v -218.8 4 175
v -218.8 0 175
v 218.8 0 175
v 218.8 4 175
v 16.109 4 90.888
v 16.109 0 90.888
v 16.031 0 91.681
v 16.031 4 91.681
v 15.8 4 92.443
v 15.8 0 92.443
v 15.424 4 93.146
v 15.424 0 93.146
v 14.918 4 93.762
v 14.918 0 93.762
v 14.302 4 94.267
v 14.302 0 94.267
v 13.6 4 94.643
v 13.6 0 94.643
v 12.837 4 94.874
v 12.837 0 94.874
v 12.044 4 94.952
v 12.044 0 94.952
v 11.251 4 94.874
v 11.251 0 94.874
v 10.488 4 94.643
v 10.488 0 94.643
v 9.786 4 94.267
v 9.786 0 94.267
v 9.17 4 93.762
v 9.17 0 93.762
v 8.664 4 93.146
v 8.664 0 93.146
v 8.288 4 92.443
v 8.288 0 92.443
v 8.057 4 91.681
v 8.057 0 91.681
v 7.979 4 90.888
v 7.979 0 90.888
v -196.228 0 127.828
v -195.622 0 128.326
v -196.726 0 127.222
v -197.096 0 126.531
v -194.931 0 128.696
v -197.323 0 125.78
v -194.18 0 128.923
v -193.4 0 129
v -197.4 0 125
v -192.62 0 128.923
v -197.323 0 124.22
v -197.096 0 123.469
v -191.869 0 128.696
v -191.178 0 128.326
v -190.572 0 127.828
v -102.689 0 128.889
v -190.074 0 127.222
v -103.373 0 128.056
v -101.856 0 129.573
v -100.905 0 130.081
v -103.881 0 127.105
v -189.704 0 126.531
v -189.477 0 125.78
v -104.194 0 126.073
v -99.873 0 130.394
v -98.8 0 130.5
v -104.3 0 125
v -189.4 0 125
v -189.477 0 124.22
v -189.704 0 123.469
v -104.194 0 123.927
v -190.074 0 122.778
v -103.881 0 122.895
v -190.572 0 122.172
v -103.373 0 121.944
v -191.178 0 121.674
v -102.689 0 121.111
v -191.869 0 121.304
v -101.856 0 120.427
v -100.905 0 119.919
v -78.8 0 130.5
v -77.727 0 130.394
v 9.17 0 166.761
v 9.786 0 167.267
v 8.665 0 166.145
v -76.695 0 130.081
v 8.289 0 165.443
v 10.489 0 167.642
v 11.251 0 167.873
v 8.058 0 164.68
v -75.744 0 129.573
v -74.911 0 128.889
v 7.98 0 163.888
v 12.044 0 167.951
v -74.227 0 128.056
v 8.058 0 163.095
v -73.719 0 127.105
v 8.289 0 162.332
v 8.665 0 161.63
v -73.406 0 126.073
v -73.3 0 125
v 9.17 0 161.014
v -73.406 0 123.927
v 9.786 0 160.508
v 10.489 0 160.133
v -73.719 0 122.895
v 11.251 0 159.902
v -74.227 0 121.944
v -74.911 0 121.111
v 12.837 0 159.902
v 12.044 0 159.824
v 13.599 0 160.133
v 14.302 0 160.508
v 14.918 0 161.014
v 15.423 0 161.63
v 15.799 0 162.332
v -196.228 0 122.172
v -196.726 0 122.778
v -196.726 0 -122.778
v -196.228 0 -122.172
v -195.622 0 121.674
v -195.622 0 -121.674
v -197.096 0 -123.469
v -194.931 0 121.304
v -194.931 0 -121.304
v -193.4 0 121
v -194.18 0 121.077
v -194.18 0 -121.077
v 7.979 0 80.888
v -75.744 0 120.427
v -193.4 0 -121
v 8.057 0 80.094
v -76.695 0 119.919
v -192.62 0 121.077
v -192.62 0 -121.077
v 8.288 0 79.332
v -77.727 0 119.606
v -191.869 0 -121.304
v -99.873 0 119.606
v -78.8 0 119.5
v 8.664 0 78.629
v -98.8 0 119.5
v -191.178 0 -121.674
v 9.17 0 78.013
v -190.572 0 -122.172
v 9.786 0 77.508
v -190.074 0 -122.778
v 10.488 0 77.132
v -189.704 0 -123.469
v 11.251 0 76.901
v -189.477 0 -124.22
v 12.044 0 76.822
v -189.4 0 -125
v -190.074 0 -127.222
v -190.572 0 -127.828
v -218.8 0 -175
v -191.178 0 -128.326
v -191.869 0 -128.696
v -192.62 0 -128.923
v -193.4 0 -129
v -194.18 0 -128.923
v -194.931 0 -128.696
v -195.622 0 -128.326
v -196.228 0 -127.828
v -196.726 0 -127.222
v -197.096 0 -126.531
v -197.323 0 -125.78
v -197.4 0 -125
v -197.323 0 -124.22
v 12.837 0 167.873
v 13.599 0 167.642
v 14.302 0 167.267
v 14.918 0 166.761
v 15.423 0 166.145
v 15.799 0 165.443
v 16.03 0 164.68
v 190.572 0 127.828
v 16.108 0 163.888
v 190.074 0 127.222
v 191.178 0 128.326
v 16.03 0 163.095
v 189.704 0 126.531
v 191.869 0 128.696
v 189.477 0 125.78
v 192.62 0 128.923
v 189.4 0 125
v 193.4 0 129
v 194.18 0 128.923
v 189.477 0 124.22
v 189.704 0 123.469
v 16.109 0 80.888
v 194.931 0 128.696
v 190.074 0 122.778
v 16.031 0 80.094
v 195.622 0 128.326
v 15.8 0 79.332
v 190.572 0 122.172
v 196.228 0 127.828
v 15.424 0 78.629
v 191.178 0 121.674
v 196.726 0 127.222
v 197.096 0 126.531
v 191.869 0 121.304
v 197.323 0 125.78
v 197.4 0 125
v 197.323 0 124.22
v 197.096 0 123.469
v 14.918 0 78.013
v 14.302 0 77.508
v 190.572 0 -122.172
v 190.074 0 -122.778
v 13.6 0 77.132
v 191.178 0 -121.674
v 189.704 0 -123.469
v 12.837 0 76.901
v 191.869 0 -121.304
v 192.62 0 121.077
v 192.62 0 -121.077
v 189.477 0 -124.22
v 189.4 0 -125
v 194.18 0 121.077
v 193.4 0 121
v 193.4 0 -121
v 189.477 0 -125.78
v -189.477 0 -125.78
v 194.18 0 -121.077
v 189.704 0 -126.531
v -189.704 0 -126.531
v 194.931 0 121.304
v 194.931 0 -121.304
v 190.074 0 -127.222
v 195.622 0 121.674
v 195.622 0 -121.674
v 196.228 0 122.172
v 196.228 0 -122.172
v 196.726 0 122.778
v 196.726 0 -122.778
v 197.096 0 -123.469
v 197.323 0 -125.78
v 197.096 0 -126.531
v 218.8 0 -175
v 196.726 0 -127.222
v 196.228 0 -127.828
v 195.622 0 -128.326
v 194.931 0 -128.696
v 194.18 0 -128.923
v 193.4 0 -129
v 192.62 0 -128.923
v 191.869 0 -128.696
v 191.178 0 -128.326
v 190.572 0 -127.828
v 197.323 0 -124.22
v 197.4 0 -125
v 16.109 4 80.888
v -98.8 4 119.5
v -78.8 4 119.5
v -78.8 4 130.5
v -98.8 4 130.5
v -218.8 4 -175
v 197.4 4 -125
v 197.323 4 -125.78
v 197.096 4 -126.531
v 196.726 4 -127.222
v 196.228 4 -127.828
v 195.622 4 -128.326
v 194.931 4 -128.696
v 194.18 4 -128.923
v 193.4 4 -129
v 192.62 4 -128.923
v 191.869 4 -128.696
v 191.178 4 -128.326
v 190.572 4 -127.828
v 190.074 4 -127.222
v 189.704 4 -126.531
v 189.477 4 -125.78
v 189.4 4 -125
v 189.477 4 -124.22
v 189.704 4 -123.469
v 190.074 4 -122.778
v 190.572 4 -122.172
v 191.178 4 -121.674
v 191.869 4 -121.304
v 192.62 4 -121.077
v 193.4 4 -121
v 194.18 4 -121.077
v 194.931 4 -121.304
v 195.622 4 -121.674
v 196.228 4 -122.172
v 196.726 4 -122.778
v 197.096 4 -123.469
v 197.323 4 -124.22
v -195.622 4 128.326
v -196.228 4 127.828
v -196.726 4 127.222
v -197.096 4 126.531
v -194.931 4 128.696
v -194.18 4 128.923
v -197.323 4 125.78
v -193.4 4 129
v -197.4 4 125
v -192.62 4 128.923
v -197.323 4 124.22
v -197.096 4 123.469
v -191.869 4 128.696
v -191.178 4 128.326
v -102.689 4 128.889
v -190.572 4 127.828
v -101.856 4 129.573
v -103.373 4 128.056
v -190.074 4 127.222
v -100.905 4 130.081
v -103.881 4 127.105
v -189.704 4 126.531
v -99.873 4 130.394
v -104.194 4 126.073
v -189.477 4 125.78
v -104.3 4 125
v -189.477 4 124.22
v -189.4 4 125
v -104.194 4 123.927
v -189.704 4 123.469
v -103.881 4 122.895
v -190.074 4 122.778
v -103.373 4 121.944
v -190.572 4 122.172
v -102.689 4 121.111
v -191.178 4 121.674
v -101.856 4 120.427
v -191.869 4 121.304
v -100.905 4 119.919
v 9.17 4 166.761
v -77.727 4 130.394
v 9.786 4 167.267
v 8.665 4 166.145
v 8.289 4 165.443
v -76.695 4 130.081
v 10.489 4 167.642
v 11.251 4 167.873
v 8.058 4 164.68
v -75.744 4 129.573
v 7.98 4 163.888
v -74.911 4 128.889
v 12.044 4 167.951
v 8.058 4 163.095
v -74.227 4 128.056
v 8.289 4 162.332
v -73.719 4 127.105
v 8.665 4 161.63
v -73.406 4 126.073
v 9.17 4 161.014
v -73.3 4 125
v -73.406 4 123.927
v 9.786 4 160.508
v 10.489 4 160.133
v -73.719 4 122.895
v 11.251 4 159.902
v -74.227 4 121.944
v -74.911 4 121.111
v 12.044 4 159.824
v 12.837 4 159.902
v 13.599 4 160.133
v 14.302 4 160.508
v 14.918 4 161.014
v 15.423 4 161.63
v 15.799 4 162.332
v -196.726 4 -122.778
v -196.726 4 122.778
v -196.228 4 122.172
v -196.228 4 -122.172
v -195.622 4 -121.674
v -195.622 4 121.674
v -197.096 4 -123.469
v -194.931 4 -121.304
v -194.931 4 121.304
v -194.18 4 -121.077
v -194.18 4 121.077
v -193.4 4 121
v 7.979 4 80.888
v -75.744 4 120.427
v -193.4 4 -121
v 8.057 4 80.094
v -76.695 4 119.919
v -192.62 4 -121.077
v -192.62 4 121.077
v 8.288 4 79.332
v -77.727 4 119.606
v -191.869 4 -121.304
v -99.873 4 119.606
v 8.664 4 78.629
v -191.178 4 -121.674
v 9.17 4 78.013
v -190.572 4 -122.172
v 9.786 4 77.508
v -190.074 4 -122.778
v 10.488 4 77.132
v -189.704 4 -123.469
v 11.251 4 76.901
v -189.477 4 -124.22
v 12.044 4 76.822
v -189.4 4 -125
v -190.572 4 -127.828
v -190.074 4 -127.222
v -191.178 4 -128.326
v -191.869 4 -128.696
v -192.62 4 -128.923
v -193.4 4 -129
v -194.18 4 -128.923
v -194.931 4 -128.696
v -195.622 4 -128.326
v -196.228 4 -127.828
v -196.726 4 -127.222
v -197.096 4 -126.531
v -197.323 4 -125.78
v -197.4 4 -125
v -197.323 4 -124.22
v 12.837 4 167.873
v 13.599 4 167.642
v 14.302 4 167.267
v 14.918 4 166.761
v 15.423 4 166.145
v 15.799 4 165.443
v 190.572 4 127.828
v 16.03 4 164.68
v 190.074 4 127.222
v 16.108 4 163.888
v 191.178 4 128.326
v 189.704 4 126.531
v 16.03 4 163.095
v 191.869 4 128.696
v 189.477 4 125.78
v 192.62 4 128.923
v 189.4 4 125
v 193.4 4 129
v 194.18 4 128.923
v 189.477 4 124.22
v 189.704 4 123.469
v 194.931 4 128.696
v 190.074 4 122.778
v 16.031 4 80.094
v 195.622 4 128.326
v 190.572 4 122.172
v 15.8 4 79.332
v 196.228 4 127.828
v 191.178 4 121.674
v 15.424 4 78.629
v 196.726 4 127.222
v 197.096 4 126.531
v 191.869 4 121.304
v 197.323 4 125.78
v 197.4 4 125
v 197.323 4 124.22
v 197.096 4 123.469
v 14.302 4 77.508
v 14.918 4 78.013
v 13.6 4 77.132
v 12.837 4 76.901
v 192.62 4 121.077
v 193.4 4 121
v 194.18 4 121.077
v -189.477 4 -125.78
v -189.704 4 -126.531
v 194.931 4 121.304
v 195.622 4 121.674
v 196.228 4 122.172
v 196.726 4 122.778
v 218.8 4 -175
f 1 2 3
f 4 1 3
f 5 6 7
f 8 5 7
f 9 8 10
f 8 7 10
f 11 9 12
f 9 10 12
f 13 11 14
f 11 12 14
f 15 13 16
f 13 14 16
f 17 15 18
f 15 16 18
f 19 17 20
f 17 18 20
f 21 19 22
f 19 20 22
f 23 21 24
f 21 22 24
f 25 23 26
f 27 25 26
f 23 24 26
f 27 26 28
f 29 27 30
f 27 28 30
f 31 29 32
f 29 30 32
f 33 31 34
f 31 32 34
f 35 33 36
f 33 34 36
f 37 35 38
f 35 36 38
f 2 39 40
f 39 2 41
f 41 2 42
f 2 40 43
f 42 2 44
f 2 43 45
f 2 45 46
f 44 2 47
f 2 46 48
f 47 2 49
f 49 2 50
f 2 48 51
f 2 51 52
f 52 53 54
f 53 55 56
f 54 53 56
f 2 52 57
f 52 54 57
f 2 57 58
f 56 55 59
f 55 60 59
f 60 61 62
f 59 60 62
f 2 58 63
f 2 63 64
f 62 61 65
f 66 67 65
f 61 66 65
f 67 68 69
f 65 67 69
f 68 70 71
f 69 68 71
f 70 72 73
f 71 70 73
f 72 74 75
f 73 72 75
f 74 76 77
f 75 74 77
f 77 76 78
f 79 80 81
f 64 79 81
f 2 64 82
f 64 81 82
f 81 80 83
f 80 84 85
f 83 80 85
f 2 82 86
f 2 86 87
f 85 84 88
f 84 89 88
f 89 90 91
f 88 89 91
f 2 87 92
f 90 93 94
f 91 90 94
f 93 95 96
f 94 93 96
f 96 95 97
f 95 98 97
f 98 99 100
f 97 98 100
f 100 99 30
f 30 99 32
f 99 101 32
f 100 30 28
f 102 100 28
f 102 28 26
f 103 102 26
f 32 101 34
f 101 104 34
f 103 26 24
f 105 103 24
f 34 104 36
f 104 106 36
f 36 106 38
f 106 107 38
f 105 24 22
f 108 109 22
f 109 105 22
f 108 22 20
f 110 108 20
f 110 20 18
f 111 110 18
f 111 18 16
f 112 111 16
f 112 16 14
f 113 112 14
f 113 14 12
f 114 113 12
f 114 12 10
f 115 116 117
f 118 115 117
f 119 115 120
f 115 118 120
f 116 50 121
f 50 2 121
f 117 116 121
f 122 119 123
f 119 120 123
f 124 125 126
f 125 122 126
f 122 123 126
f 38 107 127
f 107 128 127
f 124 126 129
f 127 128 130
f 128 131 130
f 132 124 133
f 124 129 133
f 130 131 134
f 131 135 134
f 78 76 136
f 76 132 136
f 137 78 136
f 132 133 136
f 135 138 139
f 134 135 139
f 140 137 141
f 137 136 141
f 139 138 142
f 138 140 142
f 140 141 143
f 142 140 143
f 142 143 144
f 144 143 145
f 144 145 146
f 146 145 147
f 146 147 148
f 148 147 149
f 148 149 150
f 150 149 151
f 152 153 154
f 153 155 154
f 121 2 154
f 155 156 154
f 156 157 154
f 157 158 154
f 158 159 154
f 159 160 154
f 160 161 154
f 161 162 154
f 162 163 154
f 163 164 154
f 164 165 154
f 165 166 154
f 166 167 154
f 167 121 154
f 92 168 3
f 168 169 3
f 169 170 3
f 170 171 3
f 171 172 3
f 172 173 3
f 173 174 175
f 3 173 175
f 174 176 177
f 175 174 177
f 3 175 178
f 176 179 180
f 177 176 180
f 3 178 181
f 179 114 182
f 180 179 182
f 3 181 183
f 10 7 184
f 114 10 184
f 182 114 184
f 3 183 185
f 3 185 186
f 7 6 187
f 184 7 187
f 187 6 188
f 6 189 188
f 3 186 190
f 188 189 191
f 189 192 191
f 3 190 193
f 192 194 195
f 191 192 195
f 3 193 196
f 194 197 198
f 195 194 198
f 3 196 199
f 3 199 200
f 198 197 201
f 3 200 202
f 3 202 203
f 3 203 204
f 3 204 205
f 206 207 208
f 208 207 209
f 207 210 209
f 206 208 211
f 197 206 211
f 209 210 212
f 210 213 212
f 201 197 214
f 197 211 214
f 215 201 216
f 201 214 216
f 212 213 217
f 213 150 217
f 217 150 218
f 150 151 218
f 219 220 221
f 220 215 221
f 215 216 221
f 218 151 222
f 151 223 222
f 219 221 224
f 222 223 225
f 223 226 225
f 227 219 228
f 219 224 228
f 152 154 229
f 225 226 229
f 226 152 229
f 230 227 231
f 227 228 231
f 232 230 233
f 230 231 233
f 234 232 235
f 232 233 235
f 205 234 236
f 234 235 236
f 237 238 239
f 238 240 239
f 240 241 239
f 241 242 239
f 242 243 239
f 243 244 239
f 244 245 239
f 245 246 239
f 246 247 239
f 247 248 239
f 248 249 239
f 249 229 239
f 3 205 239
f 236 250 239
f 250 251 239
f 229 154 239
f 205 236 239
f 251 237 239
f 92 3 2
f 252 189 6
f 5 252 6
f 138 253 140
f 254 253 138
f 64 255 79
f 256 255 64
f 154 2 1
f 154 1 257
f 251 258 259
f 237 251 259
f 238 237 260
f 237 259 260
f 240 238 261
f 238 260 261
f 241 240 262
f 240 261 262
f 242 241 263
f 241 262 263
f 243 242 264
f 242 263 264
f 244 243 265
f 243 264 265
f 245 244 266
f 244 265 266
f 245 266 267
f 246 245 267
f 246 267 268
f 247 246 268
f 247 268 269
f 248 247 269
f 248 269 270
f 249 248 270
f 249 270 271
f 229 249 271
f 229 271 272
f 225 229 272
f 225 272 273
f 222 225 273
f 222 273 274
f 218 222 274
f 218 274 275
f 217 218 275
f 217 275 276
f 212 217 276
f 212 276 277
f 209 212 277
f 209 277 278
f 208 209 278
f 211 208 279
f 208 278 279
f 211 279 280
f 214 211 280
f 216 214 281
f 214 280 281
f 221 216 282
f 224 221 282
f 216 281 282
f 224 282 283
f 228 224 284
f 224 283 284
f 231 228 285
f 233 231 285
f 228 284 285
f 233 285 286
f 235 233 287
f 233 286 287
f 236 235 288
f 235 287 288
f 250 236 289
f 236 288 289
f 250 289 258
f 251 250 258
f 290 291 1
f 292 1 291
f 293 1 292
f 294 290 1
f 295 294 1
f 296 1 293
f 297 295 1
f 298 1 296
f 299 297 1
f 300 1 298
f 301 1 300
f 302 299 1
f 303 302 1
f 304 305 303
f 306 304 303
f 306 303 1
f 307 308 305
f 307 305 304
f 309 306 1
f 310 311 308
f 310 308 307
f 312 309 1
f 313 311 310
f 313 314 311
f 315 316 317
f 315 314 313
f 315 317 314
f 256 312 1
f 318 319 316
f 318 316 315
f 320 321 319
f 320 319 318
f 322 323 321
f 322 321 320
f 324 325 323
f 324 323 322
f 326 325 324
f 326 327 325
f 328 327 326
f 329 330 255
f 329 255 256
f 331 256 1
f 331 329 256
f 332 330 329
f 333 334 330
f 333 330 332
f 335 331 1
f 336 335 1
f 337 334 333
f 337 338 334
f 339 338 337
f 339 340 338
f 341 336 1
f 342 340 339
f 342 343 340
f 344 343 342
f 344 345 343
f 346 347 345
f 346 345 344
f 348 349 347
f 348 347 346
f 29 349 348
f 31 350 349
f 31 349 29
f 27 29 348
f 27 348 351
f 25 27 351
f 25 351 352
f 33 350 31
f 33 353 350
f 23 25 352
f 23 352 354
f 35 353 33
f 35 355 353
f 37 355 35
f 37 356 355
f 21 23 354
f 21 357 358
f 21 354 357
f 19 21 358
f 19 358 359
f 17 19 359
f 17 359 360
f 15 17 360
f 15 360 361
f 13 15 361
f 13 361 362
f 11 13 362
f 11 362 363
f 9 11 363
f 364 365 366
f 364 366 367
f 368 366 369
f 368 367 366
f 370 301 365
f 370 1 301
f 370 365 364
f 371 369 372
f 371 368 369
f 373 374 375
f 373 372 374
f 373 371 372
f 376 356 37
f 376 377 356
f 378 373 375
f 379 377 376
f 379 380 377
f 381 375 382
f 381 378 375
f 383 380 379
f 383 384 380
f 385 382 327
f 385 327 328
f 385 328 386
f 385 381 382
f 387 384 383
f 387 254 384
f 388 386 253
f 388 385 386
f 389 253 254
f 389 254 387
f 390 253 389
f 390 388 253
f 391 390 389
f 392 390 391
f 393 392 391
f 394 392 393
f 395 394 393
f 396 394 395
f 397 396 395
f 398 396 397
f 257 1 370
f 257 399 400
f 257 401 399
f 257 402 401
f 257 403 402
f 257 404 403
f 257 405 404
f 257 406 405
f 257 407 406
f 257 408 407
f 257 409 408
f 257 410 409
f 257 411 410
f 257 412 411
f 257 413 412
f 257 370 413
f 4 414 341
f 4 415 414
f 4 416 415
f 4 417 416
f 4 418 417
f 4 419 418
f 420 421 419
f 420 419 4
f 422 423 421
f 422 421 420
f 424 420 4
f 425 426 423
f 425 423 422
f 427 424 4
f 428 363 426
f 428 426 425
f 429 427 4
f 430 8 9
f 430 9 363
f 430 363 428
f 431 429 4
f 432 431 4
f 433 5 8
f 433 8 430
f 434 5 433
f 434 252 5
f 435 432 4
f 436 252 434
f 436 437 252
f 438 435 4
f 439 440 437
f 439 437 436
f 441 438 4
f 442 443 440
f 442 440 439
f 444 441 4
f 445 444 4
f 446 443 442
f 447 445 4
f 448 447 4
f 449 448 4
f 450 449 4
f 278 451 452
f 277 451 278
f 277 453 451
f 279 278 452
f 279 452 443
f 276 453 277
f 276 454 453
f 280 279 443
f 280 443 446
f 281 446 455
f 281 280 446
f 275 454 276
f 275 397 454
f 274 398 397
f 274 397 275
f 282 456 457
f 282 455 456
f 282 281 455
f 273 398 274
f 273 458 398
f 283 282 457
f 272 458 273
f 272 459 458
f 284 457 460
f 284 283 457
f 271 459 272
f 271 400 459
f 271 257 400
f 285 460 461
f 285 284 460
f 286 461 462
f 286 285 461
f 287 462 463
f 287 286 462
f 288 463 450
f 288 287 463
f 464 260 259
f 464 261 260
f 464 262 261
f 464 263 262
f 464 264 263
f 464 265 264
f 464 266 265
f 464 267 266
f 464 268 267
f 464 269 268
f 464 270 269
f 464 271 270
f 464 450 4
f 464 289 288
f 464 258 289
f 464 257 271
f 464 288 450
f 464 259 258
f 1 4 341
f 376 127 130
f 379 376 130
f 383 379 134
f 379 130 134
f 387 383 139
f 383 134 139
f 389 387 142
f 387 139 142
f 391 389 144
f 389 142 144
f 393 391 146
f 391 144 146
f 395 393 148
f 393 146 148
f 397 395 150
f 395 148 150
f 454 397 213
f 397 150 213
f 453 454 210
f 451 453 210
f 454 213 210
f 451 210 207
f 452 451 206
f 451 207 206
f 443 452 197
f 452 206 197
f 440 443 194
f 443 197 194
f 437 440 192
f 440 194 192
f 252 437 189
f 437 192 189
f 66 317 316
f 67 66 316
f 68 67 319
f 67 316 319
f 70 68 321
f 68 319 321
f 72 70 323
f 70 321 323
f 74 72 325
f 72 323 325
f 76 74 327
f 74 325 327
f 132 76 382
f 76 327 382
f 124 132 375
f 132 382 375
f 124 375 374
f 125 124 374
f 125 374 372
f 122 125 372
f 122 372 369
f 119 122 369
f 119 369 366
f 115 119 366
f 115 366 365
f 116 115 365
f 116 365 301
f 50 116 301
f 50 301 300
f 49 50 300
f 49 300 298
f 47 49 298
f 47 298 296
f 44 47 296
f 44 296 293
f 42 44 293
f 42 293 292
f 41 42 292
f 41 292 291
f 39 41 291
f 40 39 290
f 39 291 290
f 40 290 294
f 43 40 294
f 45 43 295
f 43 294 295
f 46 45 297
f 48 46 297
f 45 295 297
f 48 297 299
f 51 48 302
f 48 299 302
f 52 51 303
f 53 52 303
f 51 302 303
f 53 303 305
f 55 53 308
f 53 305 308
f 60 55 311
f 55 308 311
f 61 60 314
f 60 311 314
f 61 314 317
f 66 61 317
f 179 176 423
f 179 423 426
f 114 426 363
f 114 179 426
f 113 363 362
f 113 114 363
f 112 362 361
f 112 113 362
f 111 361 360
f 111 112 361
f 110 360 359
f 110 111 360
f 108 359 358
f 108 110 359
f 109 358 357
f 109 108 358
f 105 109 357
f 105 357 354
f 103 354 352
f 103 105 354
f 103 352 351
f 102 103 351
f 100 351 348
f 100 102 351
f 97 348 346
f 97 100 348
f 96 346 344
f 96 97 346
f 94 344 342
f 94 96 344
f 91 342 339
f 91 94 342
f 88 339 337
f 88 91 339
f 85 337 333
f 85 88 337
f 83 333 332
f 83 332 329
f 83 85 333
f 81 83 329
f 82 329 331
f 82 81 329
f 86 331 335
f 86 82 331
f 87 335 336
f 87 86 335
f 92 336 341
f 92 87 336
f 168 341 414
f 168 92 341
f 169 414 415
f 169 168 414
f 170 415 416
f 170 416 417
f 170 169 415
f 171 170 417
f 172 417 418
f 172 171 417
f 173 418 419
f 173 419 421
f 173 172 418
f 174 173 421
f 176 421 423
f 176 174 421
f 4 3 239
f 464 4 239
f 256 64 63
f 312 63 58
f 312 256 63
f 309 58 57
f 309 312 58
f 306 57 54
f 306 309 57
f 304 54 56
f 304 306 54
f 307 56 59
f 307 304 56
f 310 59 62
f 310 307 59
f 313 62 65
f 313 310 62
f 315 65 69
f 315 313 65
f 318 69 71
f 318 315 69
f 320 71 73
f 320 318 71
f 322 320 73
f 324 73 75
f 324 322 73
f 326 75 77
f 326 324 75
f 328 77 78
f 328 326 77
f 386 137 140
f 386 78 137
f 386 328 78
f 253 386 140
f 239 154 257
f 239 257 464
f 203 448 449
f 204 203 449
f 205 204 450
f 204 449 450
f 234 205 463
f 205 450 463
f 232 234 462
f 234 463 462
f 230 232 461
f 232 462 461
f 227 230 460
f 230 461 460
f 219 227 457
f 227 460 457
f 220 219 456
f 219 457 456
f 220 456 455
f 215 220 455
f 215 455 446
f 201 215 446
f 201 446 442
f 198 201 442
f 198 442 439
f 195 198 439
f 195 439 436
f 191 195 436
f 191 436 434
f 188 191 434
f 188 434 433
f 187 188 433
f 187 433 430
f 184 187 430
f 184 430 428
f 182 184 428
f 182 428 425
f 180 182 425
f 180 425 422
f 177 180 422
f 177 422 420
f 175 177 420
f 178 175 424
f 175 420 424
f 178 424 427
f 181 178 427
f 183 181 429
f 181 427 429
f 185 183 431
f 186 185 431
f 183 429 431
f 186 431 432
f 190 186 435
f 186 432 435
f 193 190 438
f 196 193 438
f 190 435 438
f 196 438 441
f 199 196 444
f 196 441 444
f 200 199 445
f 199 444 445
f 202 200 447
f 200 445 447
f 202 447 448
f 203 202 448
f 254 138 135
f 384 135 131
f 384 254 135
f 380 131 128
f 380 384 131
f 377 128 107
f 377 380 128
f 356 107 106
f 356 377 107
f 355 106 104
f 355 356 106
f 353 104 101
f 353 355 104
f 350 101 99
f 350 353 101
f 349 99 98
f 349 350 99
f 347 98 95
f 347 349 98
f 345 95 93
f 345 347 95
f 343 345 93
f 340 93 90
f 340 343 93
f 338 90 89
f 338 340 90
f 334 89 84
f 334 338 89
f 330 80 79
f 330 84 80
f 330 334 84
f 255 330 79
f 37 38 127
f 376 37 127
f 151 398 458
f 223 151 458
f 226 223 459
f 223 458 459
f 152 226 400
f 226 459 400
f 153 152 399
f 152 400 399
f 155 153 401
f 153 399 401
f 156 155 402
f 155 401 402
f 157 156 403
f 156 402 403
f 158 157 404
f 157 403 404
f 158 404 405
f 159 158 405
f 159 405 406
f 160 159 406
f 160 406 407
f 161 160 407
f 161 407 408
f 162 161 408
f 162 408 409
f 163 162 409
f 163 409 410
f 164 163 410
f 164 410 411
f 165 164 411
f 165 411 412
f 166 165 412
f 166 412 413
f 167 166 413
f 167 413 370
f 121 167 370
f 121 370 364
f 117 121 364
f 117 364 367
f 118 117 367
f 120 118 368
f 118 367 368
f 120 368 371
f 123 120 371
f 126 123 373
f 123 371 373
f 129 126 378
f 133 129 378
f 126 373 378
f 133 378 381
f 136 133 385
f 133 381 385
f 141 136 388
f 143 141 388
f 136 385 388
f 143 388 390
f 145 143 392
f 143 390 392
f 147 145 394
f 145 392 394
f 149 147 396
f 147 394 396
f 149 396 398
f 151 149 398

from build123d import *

# Parameters (mm, degrees)
SKETCH1_W           = 437.6
SKETCH1_H           = 350
SKETCH1_R           = 4.064
BOSS_EXTRUDE1_DEPTH = 4
SKETCH2_R           = 4
CUT_EXTRUDE1_DEPTH  = 5


with BuildPart() as part:
    # Sketch1 → Boss-Extrude1 (new body)
    with BuildSketch(Plane(origin=(0, 0, 0), x_dir=(1, 0, 0), z_dir=(0, 1, 0))):
        Rectangle(SKETCH1_W, SKETCH1_H)
        with Locations((12.044, -163.8875)):
            Circle(SKETCH1_R, mode=Mode.SUBTRACT)
        with BuildLine():
            Line((7.979, -90.8875), (7.979, -80.8875))
            ThreePointArc((7.979, -80.8875), (12.044, -76.8225), (16.109, -80.8875))
            Line((16.109, -80.8875), (16.109, -90.8875))
            ThreePointArc((16.109, -90.8875), (12.044, -94.9525), (7.979, -90.8875))
        make_face(mode=Mode.SUBTRACT)
    extrude(amount=BOSS_EXTRUDE1_DEPTH)

    # Sketch2 → Cut-Extrude1 (cut, through all)
    with BuildSketch(Plane(origin=(0, 4, 0), x_dir=(1, 0, 0), z_dir=(0, 1, 0))):
        with Locations((-193.4, 125)):
            Circle(SKETCH2_R)
        with Locations((-193.4, -125)):
            Circle(SKETCH2_R)
        with Locations((193.4, -125)):
            Circle(SKETCH2_R)
        with Locations((193.4, 125)):
            Circle(SKETCH2_R)
        with BuildLine():
            Line((-98.8, -119.5), (-78.8, -119.5))
            ThreePointArc((-78.8, -119.5), (-73.3, -125), (-78.8, -130.5))
            Line((-78.8, -130.5), (-98.8, -130.5))
            ThreePointArc((-98.8, -130.5), (-104.3, -125), (-98.8, -119.5))
        make_face()
    extrude(amount=-CUT_EXTRUDE1_DEPTH, mode=Mode.SUBTRACT)


solid = part.part
